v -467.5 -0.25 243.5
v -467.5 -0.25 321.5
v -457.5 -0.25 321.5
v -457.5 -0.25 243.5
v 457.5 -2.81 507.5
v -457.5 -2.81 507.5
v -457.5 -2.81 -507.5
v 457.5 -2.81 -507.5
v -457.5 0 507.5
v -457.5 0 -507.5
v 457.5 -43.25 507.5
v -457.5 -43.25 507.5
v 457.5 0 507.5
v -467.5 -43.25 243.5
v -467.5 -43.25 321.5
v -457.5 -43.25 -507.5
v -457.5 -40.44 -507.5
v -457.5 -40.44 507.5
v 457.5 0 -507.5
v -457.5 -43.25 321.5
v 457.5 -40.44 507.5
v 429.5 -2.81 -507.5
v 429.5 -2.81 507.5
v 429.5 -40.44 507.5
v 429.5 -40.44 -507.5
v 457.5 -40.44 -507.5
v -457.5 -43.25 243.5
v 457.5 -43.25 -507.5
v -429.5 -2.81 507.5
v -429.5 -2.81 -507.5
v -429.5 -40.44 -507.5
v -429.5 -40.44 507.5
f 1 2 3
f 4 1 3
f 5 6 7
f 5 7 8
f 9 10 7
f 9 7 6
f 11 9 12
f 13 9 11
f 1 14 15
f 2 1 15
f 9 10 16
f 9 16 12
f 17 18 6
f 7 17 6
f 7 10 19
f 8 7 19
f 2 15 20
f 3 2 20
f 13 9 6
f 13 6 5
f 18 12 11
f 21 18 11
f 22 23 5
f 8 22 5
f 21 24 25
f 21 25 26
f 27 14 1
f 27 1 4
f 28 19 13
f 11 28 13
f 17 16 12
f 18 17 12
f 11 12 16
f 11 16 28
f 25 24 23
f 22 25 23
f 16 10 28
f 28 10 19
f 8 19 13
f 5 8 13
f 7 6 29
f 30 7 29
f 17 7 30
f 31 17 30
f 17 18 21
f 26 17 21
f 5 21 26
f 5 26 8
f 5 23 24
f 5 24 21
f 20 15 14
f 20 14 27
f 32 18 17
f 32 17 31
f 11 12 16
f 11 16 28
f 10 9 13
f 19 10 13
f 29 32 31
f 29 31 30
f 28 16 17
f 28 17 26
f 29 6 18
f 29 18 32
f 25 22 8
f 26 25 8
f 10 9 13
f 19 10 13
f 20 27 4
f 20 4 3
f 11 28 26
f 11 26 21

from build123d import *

# Parameters (mm, degrees)
F0_W     = 915
F0_H     = 1015
F1_DEPTH = 43.25
F2_DEPTH = 2.81
F3_DEPTH = 2.81
F4_W     = 10
F4_H     = 78
F5_DEPTH = 43
F6_W     = 28
F6_H     = 37.63
F7_DEPTH = 1015


with BuildPart() as f1:
    # F0 (on Front) → F1 (new body)
    with BuildSketch(Plane.XZ):
        Rectangle(F0_W, F0_H)
    extrude(amount=F1_DEPTH)


with BuildPart() as f2:
    # F2 (new): a face of the model
    f2_faces = [f1.part.faces().sort_by_distance(p)[0] for p in [
        (0, -43.25, 0),
    ]]
    extrude(f2_faces, amount=-F2_DEPTH)


with BuildPart() as f3:
    # F3 (new): a face of the model
    f3_faces = [f1.part.faces().sort_by_distance(p)[0] for p in [
        (0, 0, 0),
    ]]
    extrude(f3_faces, amount=-F3_DEPTH)


with BuildPart() as f5:
    # F4 (on face) → F5 (new body)
    with BuildSketch(Plane.XZ.offset(43.25)):
        with Locations((-462.5, 282.5)):
            Rectangle(F4_W, F4_H)
    extrude(amount=-F5_DEPTH)


with BuildPart() as f7:
    # F6 (on face) → F7 (new body, through all)
    with BuildSketch(Plane.XY.offset(507.5)):
        with Locations((443.5, -21.625)):
            Rectangle(F6_W, F6_H)
    extrude(amount=-F7_DEPTH)


with BuildPart() as f7b:
    # F6 (on face) → F7, piece 2 (new body, through all)
    with BuildSketch(Plane.XY.offset(507.5)):
        with Locations((-443.5, -21.625)):
            Rectangle(F6_W, F6_H)
    extrude(amount=-F7_DEPTH)


solid = Compound([f1.part, f2.part, f3.part, f5.part, f7.part, f7b.part])
